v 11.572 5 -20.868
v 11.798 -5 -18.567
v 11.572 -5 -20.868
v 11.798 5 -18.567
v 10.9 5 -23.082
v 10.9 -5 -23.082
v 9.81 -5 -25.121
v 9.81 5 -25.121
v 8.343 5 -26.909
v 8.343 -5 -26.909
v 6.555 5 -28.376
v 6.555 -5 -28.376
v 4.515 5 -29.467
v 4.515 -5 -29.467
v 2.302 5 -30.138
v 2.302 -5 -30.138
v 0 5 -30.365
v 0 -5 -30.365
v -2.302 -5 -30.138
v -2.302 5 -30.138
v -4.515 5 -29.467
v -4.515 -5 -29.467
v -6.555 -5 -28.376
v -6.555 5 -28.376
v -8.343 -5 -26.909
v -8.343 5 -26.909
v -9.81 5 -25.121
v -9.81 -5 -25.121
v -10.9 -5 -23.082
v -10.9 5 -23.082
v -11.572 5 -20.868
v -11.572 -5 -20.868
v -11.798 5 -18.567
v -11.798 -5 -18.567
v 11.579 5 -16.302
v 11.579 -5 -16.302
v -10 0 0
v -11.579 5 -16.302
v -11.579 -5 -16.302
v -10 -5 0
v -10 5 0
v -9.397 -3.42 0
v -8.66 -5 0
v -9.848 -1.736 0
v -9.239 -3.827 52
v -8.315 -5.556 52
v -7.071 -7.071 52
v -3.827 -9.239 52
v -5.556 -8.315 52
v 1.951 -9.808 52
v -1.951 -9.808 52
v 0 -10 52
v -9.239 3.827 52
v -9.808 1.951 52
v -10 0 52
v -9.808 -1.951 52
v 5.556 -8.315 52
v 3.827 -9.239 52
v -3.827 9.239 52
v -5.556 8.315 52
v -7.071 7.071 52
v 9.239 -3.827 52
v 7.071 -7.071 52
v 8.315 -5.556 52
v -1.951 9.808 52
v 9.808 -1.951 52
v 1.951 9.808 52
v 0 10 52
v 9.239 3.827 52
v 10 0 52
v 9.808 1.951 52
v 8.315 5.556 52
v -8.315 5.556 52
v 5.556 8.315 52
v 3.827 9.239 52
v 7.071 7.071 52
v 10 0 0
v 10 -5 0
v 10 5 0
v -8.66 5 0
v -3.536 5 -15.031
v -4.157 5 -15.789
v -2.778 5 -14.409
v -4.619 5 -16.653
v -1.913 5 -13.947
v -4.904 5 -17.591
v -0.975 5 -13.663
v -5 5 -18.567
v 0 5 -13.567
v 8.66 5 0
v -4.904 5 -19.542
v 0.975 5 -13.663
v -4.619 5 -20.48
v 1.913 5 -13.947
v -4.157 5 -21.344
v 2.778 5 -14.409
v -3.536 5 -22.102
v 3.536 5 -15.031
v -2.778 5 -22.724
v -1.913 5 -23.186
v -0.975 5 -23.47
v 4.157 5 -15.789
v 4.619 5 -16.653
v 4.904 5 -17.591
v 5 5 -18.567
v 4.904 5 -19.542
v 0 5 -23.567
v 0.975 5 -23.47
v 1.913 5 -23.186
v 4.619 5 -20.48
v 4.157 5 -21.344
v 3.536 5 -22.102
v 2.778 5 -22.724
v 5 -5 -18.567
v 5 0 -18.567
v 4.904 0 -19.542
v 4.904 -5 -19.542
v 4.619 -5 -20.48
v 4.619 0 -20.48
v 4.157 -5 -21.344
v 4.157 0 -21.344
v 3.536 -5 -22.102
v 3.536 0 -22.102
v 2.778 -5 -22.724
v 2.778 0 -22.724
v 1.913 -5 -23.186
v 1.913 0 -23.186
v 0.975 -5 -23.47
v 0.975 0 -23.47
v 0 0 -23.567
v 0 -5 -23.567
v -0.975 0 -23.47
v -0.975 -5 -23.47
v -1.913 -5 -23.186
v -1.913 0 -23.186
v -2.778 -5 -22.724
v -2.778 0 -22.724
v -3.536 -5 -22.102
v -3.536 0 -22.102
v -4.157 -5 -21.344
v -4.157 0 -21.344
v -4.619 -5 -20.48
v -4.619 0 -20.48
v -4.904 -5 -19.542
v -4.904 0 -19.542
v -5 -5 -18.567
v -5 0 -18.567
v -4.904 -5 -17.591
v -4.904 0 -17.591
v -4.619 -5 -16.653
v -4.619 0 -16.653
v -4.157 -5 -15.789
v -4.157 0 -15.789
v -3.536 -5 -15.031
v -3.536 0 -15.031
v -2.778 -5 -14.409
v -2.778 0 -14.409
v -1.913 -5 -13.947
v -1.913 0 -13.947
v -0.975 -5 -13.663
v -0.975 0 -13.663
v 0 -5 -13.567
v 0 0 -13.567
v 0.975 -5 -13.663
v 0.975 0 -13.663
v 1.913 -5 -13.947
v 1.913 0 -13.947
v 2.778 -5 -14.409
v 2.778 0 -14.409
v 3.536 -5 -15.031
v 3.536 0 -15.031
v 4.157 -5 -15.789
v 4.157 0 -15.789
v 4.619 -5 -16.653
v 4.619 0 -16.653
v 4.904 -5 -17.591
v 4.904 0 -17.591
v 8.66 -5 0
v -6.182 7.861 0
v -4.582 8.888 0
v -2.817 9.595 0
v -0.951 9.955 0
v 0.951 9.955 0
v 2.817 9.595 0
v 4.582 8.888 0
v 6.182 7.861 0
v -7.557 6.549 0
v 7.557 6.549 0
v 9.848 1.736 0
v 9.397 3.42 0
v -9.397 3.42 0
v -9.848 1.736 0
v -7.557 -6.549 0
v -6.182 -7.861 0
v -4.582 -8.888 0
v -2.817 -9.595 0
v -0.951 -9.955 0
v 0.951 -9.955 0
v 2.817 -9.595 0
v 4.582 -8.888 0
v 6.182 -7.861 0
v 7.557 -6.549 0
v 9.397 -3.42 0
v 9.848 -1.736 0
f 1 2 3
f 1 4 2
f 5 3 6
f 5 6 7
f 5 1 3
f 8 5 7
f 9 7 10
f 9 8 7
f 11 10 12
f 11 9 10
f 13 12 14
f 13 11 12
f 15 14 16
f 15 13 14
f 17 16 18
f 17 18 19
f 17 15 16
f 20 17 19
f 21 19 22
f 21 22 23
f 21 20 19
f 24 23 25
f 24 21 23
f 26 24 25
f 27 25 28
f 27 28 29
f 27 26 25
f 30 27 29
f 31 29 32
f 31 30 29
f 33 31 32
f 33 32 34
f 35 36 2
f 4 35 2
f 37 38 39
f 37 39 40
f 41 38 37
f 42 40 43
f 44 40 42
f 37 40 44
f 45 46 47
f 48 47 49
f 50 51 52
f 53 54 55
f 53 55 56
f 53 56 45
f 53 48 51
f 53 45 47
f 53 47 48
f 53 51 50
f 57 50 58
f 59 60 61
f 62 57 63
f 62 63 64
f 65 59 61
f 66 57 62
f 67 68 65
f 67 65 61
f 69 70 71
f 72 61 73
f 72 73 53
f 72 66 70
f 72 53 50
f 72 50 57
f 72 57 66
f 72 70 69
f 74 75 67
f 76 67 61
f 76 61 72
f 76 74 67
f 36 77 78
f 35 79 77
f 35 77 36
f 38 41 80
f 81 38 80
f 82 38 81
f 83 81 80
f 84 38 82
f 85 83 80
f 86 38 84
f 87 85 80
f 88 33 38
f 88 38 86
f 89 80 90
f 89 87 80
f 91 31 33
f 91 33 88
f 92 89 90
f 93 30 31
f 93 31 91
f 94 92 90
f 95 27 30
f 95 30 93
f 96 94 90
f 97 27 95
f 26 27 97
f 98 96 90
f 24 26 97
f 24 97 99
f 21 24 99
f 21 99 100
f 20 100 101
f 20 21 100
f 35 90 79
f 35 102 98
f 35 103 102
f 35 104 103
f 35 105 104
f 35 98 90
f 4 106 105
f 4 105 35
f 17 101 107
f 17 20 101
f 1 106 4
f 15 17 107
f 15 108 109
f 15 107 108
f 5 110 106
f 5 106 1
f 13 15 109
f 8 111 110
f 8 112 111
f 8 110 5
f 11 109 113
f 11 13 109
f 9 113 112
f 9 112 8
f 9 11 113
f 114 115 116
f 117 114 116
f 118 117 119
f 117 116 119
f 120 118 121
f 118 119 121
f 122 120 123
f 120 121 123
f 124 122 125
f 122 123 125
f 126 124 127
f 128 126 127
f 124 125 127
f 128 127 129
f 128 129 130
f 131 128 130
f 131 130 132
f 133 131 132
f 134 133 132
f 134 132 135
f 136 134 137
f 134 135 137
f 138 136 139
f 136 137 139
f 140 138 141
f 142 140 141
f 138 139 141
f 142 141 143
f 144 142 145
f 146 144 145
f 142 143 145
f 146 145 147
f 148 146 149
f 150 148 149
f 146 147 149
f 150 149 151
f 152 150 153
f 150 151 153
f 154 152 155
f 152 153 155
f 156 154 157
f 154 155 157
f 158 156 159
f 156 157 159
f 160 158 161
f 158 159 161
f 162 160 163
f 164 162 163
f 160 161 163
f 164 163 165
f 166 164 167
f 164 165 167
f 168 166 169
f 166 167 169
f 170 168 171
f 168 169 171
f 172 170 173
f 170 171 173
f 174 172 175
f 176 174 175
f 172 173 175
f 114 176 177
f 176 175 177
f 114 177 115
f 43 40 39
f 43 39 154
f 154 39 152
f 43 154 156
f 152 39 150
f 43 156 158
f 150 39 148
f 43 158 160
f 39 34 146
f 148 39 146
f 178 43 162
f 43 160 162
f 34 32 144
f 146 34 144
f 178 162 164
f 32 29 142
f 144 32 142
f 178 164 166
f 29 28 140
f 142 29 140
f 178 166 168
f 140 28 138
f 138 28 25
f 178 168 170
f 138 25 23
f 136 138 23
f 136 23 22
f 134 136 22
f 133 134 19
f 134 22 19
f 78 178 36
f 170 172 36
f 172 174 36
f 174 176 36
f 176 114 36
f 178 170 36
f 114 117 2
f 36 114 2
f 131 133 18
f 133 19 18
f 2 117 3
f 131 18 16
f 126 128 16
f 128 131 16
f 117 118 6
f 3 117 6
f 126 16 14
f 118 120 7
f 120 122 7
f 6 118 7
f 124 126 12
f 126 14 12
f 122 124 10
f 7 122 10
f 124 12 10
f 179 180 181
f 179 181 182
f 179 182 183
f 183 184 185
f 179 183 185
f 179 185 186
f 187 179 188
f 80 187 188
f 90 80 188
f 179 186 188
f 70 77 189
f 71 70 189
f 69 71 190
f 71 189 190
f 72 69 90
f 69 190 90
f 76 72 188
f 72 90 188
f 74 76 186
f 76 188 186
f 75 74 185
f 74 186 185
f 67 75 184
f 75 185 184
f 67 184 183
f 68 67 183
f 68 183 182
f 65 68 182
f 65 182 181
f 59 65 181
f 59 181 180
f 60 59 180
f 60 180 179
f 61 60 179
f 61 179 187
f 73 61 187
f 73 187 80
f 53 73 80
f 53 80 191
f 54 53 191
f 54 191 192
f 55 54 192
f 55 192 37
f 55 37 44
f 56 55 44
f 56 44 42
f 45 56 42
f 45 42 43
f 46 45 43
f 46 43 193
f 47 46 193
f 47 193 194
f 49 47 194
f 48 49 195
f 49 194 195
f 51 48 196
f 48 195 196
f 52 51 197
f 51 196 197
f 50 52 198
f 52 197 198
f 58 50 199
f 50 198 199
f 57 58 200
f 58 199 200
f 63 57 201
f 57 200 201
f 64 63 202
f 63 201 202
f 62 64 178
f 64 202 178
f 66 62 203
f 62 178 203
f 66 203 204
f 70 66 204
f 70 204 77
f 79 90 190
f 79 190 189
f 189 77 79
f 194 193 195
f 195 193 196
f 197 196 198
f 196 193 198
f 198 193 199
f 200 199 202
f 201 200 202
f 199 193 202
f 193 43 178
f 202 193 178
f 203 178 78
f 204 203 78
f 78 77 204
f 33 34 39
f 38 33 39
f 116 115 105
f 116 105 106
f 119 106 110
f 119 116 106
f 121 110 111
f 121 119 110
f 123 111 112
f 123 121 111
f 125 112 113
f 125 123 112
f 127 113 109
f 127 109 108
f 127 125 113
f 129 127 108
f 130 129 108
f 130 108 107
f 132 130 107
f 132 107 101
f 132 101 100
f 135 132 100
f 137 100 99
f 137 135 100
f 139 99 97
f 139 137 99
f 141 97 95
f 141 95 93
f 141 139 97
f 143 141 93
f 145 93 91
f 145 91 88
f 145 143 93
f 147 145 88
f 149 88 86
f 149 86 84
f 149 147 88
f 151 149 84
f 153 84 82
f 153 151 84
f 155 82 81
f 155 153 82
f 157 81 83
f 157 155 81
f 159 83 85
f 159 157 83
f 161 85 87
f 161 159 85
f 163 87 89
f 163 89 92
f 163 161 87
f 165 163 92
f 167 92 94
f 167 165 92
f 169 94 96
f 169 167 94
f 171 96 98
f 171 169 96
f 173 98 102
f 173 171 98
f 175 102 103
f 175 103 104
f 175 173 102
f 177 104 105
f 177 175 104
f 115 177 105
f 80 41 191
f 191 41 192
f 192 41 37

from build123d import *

# Parameters (mm, degrees)
SKETCH_1_R           = 10
EXTRUDE_1_DEPTH      = 52
EXTRUDE_2_DEPTH      = 5
EXTRUDE_2_DEPTH_BACK = 5
SKETCH_2_R           = 5


with BuildPart() as part:
    # Эскиз1 → Бобышка-Вытянуть1 (new body)
    with BuildSketch(Plane.XY):
        Circle(SKETCH_1_R)
    extrude(amount=EXTRUDE_1_DEPTH)

    # Эскиз2 → Бобышка-Вытянуть2 (add, two sides: drawn at the far end of the back side and taken through both)
    with BuildSketch(Plane(origin=(0, 0, 0), x_dir=(1, 0, 0), z_dir=(0, 1, 0)).offset(-EXTRUDE_2_DEPTH_BACK)):
        with BuildLine():
            ThreePointArc((11.798274507, 18.566546971), (0, 30.364821478), (-11.798274507, 18.566546971))
            Line((-11.798274507, 18.566546971), (-11.578972273, 16.302329128))
            Line((-11.578972273, 16.302329128), (-10, 0))
            Line((-10, 0), (10, 0))
            Line((10, 0), (11.578972273, 16.302329128))
            Line((11.578972273, 16.302329128), (11.798274507, 18.566546971))
        make_face()
        with Locations((0, 18.566546971)):
            Circle(SKETCH_2_R, mode=Mode.SUBTRACT)
    extrude(amount=EXTRUDE_2_DEPTH + EXTRUDE_2_DEPTH_BACK)


solid = part.part
